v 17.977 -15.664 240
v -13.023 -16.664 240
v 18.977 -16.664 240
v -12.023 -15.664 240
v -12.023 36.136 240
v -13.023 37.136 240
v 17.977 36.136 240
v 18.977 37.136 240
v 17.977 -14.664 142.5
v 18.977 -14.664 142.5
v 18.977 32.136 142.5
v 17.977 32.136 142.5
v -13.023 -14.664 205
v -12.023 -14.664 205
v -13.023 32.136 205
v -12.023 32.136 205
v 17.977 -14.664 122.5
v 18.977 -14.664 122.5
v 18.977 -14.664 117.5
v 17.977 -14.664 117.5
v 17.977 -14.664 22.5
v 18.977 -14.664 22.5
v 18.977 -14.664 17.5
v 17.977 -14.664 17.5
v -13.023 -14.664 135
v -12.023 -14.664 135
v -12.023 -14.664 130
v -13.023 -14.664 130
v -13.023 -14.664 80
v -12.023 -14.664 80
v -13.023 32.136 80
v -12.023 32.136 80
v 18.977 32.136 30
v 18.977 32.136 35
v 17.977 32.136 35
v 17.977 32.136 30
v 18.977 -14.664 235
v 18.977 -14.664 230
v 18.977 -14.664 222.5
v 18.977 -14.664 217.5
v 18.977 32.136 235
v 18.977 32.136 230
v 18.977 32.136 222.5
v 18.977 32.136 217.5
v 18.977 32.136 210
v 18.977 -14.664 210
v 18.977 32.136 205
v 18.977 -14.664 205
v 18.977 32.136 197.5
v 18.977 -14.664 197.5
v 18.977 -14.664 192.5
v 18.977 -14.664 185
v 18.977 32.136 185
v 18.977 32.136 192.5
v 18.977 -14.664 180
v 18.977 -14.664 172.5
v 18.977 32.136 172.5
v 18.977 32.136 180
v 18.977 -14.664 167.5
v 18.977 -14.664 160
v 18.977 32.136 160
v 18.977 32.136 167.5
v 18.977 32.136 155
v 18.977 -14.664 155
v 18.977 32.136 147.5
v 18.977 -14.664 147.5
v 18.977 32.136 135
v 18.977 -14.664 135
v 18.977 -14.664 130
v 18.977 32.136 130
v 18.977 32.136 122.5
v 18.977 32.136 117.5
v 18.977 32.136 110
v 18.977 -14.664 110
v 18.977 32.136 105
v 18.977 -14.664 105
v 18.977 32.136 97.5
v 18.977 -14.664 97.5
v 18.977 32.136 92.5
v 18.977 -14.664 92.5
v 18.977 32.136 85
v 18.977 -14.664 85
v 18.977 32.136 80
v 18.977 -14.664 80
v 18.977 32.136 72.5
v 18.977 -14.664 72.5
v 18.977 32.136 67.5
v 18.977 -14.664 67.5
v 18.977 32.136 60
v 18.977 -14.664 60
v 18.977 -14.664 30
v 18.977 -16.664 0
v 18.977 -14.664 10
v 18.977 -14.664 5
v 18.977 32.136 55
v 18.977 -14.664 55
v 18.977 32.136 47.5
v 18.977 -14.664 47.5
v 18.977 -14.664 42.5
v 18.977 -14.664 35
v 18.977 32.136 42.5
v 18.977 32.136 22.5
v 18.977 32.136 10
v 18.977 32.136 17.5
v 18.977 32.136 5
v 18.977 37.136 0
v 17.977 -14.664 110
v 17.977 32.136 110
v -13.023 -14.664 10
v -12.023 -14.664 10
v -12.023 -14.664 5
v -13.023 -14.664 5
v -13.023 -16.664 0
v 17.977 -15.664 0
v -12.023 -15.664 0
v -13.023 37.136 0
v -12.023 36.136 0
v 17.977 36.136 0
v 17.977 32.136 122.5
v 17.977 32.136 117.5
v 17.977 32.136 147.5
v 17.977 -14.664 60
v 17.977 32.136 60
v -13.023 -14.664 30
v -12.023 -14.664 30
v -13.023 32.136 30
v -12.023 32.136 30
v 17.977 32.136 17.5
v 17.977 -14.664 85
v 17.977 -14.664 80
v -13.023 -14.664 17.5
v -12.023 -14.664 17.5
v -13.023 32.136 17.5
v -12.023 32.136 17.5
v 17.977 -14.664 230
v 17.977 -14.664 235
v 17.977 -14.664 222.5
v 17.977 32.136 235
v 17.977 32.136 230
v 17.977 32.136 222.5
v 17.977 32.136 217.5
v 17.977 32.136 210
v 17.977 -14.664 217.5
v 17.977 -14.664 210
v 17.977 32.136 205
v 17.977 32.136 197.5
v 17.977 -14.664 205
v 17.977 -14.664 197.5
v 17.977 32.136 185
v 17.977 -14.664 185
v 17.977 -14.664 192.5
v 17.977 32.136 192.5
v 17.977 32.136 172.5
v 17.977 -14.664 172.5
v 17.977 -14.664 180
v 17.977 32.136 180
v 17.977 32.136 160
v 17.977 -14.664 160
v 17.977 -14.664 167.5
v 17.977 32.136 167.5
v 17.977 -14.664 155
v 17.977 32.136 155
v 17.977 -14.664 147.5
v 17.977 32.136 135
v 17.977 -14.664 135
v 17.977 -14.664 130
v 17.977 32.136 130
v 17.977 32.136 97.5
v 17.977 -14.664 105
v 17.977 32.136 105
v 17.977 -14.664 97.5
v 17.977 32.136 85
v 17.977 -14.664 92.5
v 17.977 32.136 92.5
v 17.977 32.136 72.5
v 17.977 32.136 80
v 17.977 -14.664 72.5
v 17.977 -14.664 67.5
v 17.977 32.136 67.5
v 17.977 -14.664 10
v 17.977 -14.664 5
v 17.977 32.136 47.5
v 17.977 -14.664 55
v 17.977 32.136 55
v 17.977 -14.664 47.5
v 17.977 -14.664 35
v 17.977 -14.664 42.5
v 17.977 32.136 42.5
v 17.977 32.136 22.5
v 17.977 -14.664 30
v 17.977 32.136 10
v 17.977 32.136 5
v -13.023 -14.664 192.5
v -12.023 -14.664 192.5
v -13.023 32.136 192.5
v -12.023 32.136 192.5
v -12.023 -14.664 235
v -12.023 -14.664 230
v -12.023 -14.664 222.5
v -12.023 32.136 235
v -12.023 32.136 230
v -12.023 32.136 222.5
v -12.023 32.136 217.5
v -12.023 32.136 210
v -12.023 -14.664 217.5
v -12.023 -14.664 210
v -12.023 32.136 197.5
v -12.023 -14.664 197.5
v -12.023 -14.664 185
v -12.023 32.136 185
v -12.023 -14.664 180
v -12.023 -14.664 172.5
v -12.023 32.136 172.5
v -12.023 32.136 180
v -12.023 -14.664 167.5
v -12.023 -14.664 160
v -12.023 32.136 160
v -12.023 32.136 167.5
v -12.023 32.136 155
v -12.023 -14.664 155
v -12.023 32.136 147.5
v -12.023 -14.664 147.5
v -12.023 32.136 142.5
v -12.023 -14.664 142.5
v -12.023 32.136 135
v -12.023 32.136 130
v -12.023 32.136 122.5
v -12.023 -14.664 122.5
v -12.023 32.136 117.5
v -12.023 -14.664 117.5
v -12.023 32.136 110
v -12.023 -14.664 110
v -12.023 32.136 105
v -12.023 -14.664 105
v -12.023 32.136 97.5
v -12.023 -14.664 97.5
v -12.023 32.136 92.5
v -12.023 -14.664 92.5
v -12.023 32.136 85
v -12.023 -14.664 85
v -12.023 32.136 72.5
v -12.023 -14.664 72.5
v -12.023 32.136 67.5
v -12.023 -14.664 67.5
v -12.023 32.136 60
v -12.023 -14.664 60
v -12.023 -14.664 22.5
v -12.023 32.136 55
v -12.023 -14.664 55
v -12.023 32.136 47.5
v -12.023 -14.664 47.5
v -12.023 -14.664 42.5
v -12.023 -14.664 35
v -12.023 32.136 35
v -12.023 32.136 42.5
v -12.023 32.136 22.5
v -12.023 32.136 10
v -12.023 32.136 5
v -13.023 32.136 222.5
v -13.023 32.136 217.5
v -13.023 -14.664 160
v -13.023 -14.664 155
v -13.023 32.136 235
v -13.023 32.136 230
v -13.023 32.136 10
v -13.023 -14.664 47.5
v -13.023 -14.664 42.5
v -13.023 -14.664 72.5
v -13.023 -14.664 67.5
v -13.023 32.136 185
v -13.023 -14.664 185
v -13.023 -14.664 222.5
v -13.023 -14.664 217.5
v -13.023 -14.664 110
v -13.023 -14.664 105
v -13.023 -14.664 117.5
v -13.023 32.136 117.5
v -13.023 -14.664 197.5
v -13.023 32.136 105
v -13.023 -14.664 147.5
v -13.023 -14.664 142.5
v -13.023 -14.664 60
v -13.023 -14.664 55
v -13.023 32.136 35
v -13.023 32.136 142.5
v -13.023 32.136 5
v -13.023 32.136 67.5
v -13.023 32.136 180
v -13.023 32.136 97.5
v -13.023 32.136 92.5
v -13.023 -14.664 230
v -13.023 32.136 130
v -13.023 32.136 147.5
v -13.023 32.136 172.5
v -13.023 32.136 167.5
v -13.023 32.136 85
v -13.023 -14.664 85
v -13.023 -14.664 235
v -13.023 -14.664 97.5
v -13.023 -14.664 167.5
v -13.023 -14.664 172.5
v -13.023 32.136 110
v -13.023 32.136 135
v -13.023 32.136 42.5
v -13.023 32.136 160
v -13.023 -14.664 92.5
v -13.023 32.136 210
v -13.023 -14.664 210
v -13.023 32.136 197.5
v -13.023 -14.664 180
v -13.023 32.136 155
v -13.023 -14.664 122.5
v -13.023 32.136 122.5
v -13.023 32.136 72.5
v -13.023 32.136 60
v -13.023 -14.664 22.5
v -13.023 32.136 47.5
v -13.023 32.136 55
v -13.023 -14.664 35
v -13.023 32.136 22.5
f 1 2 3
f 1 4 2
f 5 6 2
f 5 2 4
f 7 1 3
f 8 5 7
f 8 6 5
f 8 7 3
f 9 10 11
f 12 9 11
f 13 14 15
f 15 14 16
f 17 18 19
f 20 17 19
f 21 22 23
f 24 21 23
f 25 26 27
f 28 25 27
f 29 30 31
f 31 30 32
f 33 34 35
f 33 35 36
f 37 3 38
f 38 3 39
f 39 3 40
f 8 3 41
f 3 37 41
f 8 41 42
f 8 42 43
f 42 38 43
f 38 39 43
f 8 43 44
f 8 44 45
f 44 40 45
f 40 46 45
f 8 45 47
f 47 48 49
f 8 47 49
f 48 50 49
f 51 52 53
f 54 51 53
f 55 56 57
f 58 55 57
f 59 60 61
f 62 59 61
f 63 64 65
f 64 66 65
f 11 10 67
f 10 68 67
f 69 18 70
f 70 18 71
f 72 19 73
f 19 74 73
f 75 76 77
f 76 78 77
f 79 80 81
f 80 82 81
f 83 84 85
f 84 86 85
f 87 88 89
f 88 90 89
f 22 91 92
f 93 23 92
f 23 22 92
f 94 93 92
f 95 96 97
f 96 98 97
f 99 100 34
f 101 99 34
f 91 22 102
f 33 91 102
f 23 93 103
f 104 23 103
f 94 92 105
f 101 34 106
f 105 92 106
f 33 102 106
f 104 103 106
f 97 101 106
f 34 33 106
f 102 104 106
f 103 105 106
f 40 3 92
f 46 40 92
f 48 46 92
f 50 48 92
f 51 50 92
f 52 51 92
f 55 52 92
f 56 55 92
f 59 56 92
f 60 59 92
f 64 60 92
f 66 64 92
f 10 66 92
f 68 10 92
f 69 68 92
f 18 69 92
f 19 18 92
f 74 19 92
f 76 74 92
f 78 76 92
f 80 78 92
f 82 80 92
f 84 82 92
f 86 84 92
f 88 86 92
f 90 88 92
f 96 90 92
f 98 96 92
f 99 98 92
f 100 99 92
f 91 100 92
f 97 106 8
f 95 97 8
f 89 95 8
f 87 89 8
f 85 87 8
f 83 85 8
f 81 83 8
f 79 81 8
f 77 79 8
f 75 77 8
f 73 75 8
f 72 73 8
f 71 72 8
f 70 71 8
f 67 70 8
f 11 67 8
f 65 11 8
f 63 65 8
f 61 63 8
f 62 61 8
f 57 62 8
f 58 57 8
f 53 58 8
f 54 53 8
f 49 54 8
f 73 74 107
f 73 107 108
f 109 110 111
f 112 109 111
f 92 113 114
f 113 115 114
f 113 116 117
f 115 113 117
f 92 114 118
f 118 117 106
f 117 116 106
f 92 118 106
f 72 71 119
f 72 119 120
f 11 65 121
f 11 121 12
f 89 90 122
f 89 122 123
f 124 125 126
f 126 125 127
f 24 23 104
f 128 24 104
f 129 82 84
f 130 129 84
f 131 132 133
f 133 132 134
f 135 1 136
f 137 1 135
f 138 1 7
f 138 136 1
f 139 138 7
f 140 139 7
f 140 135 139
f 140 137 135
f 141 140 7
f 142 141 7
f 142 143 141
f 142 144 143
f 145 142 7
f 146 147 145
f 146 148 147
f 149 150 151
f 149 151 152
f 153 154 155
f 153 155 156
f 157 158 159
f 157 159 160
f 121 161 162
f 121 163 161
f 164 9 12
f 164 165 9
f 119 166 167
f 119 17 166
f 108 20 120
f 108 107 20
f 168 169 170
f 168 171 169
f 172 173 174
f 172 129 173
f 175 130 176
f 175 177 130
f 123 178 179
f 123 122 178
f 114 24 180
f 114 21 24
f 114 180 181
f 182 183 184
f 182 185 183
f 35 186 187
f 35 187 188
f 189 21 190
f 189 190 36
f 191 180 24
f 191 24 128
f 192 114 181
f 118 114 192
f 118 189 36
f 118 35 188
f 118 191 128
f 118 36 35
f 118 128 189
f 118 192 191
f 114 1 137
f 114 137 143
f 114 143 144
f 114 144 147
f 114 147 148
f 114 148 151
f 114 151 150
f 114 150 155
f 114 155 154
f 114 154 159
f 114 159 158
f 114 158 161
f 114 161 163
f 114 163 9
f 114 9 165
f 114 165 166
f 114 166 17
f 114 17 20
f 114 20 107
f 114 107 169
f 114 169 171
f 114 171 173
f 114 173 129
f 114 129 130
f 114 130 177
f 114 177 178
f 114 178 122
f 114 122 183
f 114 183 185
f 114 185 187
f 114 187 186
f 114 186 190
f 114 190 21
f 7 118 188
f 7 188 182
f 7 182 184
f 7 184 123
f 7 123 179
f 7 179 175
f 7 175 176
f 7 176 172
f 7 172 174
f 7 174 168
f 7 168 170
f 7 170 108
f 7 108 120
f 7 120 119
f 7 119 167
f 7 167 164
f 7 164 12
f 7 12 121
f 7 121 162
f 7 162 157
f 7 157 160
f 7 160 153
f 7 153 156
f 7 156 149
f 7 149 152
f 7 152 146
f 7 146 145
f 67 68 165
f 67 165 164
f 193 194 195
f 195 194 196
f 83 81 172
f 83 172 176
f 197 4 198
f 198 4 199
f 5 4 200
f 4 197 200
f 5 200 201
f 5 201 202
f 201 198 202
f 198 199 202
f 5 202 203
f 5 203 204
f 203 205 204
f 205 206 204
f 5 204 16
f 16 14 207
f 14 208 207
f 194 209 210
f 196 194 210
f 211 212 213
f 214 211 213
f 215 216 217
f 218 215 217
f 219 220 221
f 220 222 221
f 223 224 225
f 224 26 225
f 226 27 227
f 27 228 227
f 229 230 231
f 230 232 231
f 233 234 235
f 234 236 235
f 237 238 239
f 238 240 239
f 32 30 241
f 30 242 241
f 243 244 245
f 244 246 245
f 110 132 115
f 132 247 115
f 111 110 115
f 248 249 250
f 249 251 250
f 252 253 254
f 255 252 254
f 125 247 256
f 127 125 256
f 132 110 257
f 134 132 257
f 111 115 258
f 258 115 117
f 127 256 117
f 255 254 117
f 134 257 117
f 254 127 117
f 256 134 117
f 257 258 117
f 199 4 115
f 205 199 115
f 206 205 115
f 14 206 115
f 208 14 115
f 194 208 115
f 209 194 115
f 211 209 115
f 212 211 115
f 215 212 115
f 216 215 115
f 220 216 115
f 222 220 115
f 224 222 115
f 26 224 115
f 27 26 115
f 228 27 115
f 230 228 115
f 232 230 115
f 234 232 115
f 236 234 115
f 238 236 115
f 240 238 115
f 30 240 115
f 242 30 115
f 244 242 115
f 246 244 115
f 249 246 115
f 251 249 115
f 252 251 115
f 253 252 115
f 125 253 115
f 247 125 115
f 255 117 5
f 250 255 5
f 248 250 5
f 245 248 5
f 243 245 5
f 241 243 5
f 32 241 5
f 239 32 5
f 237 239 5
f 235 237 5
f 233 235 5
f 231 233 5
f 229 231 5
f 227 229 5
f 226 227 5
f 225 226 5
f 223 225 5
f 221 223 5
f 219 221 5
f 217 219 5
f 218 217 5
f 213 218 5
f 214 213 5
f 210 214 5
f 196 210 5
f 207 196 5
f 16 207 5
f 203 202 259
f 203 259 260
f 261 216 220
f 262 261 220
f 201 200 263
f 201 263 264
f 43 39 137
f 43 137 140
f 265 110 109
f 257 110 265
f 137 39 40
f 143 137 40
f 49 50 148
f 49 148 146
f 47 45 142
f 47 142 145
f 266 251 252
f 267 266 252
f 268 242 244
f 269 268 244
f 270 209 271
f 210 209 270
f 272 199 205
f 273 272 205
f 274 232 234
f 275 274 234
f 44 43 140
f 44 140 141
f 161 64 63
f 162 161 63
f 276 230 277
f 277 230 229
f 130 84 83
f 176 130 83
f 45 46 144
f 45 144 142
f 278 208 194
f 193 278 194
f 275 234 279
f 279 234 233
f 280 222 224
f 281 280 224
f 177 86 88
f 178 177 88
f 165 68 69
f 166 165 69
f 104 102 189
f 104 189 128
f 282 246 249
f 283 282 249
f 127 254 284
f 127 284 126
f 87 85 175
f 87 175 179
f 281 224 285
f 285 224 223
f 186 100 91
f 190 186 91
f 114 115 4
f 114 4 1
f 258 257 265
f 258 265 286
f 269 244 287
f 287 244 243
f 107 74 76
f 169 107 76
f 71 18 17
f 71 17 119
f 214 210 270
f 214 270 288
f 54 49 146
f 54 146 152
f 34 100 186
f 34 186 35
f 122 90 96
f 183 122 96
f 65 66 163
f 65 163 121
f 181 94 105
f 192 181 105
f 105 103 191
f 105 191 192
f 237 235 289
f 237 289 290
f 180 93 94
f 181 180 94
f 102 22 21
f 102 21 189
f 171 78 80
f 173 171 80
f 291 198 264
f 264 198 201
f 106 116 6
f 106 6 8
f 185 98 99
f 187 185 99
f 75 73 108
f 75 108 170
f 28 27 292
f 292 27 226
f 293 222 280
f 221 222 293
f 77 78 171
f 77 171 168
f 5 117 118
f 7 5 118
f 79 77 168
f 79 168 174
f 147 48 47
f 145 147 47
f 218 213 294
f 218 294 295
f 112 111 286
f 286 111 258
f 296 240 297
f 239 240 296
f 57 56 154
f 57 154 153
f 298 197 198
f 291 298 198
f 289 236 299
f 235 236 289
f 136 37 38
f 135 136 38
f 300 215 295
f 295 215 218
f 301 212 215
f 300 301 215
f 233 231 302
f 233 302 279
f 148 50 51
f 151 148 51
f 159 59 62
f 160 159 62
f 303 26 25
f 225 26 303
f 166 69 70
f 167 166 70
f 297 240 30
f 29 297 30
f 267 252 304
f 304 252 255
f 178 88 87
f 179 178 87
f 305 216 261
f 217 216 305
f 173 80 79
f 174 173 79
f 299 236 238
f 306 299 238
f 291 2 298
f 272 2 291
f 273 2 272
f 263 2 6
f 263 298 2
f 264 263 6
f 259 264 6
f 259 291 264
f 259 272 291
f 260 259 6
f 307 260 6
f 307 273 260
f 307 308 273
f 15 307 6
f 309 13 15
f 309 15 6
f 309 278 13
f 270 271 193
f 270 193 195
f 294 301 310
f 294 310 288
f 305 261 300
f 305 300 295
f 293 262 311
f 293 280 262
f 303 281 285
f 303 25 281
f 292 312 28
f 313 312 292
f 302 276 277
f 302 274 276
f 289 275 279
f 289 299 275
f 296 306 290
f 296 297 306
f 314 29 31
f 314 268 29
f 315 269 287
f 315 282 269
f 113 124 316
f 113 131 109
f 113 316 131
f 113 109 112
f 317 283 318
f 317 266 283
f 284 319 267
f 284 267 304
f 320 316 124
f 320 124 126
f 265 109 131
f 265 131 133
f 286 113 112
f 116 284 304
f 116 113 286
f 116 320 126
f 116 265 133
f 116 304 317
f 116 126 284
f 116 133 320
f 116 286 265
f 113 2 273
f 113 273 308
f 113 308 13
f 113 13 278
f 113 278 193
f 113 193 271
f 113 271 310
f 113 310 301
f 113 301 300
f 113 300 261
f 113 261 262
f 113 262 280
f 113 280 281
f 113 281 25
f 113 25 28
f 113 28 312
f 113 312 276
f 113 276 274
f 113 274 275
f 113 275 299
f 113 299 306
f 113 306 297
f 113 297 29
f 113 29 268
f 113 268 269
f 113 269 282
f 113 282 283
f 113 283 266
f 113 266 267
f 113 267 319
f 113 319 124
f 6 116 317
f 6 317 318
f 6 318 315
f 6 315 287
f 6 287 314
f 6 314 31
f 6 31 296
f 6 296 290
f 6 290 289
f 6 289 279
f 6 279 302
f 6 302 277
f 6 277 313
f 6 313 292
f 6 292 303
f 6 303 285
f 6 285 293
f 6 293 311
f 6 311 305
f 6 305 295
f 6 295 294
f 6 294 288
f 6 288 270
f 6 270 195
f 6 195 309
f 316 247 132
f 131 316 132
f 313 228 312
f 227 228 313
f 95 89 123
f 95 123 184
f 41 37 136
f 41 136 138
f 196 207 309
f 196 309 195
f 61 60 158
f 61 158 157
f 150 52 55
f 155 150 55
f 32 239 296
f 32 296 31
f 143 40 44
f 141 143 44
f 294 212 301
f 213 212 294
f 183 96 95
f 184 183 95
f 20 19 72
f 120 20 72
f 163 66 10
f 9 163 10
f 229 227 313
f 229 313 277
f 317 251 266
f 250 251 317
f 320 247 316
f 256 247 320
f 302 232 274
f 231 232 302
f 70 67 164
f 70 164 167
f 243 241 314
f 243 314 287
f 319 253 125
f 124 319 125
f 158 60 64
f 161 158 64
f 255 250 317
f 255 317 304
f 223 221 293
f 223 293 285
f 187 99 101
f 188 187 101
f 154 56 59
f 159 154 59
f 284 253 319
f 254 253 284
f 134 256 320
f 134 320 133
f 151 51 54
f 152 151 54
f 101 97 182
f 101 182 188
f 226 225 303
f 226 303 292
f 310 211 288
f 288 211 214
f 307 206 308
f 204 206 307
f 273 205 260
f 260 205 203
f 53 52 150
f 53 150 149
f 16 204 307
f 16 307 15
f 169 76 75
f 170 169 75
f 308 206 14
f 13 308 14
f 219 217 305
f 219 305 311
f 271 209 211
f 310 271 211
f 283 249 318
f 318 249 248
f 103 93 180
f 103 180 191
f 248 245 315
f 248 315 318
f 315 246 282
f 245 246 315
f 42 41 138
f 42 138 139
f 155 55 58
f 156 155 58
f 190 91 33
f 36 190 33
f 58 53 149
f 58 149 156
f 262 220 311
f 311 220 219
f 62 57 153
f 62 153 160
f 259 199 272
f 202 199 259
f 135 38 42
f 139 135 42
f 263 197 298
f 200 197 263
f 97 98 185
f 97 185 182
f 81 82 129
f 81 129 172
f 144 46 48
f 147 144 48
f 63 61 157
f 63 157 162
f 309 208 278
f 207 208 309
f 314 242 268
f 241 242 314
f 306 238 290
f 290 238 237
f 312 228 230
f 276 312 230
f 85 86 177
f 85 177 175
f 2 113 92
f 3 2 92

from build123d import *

# Parameters (mm, degrees)
ESQUISSE1_W                = 32
ESQUISSE1_H                = 53.8
ESQUISSE1_W_2              = 30
ESQUISSE1_H_2              = 51.8
BOSS_EXTRU_1_DEPTH         = 240
ESQUISSE2_W                = 5
ESQUISSE2_H                = 46.8
ENL_V_MAT_EXTRU_1_DEPTH    = 32
R_P_TITION_LIN_AIRE1_COUNT = 19
R_P_TITION_LIN_AIRE1_PITCH = 12.5


with BuildPart() as part:
    # Esquisse1 → Boss.-Extru.1 (new body)
    with BuildSketch(Plane.XY):
        with Locations((2.977116986, 10.236099585)):
            Rectangle(ESQUISSE1_W, ESQUISSE1_H)
        with Locations((2.977116986, 10.236099585)):
            Rectangle(ESQUISSE1_W_2, ESQUISSE1_H_2, mode=Mode.SUBTRACT)
    extrude(amount=BOSS_EXTRU_1_DEPTH)

    # Esquisse2 → Enlèv. mat.-Extru.1 (cut)
    with BuildSketch(Plane(origin=(18.977116986, 0, 0), x_dir=(0, 0, -1), z_dir=(1, 0, 0))):
        with Locations((-7.5, 8.736099585)):
            Rectangle(ESQUISSE2_W, ESQUISSE2_H)
    enl_v_mat_extru_1 = extrude(amount=-ENL_V_MAT_EXTRU_1_DEPTH, mode=Mode.SUBTRACT)

    # Répétition linéaire1: Enlèv. mat.-Extru.1 ×19
    with Locations(*[(0, 0, i * R_P_TITION_LIN_AIRE1_PITCH) for i in range(1, R_P_TITION_LIN_AIRE1_COUNT)]):
        add(enl_v_mat_extru_1, mode=Mode.SUBTRACT)


solid = part.part
